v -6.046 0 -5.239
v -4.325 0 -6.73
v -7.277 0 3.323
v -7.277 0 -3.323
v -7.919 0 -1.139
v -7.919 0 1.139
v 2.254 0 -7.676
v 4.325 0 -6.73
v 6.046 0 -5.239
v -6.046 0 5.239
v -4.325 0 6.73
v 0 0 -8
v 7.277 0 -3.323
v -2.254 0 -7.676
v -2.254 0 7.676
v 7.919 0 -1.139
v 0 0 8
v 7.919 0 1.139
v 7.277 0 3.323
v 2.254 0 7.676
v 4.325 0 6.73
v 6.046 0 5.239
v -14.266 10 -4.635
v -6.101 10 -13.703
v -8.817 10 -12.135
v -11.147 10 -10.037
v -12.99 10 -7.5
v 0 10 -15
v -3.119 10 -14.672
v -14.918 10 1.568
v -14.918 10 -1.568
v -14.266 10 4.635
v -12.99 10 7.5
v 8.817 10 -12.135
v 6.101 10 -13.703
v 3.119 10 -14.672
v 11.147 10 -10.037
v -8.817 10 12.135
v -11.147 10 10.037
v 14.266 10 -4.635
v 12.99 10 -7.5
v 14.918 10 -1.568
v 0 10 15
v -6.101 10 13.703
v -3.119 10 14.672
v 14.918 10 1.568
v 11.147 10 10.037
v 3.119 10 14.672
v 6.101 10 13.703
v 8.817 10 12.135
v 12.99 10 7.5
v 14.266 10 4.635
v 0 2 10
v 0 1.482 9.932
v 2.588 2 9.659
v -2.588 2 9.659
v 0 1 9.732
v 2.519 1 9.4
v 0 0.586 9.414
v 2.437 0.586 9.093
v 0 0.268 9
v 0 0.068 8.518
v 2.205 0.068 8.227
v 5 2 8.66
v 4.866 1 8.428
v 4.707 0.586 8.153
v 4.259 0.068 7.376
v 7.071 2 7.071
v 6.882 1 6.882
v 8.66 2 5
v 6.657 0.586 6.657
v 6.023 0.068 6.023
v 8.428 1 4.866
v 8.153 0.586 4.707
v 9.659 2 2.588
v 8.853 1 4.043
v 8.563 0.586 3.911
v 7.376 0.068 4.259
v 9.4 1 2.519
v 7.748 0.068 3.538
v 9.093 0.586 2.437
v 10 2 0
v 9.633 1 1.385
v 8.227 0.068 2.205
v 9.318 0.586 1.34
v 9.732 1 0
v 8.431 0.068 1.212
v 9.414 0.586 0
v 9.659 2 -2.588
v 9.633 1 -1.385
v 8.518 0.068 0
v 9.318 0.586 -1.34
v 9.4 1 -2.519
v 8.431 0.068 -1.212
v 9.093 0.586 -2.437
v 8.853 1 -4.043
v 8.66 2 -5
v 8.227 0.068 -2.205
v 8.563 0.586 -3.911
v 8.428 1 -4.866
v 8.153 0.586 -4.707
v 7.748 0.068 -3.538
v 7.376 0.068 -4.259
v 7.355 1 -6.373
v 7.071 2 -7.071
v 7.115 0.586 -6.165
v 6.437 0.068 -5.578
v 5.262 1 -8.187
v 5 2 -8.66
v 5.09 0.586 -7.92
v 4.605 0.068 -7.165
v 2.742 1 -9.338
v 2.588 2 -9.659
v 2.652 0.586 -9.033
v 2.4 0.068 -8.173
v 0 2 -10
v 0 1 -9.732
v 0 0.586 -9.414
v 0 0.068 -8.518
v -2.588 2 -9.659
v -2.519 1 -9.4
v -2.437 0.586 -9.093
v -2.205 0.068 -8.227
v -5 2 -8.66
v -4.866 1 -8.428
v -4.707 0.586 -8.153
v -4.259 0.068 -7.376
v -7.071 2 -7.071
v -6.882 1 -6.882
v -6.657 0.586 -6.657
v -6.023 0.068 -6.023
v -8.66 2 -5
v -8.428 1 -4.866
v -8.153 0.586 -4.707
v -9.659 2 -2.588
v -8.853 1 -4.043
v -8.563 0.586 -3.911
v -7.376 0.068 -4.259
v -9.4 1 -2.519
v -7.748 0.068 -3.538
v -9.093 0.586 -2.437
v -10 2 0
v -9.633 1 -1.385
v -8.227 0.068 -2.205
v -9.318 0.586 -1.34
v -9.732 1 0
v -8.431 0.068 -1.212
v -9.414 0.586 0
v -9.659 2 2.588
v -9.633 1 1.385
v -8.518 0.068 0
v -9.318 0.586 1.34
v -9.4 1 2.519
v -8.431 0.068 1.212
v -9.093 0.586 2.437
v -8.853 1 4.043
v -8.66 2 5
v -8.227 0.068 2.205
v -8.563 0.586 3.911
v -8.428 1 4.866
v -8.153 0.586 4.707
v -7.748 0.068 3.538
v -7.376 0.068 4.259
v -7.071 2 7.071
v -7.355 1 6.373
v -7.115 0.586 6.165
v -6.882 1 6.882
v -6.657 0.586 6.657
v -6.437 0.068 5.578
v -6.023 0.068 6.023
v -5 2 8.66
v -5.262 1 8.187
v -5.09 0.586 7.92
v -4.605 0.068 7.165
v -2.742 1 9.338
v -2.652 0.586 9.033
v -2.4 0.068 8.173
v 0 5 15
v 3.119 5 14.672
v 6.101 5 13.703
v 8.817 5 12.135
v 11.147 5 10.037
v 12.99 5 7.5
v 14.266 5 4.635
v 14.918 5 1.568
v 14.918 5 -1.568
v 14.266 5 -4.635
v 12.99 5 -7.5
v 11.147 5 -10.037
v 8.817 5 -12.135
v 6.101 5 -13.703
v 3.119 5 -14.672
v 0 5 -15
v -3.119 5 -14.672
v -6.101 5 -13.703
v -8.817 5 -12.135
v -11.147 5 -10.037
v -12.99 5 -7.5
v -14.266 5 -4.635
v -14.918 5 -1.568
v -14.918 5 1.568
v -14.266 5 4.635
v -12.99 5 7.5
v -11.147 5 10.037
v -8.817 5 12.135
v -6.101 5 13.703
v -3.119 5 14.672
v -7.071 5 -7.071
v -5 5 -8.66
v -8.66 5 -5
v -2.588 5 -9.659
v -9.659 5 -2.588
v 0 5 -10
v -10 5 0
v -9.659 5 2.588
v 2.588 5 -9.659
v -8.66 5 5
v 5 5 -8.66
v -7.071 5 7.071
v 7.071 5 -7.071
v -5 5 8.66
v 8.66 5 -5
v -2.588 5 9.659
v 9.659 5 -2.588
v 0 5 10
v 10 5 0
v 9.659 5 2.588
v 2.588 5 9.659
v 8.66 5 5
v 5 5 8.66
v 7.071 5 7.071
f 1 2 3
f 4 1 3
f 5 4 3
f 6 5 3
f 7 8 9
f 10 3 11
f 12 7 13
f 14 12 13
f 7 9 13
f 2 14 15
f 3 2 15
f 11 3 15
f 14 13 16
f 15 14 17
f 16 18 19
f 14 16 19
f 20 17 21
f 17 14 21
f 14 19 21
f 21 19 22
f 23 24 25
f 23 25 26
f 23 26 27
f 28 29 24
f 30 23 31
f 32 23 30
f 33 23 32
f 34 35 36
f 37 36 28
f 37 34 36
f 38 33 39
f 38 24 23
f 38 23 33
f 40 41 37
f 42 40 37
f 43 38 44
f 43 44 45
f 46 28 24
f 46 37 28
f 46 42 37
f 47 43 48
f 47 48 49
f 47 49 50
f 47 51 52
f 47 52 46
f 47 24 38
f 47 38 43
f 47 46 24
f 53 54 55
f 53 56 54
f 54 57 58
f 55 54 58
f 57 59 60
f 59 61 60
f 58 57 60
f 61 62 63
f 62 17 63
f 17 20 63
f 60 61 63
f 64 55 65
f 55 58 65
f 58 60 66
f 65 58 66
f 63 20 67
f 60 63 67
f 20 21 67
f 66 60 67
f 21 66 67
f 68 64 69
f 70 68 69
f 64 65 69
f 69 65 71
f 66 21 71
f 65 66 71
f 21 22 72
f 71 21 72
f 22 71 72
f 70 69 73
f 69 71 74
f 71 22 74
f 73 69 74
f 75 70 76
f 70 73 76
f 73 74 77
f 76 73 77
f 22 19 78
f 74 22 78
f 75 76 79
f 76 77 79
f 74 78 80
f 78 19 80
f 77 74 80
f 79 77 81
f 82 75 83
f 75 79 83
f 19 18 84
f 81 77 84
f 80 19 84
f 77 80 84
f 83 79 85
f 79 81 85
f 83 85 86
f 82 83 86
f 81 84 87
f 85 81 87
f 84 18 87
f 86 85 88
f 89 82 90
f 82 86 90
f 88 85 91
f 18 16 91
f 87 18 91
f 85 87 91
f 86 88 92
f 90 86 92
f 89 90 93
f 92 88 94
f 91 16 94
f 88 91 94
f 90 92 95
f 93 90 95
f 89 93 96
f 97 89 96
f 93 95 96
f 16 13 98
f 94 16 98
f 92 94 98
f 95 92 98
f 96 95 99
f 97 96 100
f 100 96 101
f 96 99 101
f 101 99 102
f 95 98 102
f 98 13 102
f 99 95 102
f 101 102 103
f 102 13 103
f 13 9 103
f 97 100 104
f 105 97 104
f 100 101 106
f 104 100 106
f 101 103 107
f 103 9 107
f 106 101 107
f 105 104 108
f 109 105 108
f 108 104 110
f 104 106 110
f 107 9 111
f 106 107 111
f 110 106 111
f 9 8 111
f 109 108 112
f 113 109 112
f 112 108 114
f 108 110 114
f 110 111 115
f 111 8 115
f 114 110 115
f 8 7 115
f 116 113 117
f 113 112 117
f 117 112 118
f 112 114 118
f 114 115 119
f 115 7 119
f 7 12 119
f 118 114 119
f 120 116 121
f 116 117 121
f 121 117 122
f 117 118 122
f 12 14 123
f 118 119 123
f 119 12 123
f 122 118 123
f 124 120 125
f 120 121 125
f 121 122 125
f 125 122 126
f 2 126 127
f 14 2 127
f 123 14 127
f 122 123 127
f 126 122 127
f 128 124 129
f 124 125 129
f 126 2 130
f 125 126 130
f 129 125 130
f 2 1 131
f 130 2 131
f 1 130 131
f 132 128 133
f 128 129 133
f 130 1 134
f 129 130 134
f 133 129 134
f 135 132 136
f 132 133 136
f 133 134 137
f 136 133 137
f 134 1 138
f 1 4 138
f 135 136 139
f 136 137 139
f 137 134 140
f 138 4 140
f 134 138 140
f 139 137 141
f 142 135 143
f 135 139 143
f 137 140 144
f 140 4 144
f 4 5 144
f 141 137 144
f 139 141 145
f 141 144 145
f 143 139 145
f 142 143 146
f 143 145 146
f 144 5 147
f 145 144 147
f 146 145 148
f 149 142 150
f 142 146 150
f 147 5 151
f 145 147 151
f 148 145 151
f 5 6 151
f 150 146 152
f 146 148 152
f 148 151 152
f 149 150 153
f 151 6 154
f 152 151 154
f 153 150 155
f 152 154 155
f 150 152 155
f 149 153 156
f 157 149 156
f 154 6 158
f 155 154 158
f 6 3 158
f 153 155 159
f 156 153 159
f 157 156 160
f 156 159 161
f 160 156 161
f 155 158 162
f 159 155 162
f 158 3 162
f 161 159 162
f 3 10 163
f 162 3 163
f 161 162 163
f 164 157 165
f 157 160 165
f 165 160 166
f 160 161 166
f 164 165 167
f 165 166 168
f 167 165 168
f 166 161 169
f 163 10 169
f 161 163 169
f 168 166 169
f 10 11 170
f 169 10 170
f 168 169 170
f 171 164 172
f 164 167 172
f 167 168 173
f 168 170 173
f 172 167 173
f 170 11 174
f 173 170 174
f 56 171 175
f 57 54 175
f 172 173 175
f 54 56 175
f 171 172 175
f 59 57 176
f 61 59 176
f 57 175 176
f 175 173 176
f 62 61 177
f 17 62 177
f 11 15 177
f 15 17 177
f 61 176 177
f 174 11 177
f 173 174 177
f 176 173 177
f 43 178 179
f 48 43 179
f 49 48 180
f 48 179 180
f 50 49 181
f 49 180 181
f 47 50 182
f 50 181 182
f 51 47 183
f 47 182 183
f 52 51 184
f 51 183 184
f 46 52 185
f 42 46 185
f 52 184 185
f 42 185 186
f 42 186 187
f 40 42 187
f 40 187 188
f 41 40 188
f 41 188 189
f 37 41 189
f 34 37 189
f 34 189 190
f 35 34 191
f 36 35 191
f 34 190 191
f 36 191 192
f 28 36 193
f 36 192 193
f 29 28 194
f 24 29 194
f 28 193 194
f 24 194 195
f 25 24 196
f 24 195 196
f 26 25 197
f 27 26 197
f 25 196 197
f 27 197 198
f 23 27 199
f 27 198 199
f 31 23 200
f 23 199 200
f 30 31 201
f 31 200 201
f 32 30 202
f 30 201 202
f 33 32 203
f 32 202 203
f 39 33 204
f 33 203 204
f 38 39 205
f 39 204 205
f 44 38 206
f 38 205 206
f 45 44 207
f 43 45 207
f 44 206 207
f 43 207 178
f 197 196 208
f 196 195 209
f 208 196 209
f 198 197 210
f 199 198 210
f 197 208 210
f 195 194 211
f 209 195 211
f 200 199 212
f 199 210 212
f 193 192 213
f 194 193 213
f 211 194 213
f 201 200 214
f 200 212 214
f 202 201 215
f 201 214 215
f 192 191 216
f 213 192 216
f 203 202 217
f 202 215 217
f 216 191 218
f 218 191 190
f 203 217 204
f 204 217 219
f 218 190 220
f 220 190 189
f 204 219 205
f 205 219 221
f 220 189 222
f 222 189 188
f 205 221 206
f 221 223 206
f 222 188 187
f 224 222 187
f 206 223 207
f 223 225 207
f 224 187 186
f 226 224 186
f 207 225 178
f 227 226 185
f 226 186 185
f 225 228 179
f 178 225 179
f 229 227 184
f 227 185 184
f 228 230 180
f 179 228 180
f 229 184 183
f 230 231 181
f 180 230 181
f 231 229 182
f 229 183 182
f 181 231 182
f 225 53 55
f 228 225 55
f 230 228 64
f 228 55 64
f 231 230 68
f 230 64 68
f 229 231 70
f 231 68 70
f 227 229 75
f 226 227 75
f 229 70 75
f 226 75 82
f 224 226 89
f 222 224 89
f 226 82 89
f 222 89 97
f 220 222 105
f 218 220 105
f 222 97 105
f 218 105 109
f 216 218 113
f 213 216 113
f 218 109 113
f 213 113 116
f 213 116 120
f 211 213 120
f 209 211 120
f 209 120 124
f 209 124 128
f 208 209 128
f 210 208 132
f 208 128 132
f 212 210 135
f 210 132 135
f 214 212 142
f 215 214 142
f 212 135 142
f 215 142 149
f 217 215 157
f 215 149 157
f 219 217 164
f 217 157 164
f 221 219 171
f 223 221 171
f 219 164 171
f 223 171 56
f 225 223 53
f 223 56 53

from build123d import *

# Parameters (mm, degrees)
SZKIC1_R                    = 10
DODANIE_WYCI_GNI_CIE1_DEPTH = 5
ZAOKR_GLENIE3_R             = 2
SZKIC2_R                    = 15
DODANIE_WYCI_GNI_CIE2_DEPTH = 5


with BuildPart() as part:
    # Szkic1 → Dodanie-wyciągnięcie1 (new body)
    with BuildSketch(Plane(origin=(0, 0, 0), x_dir=(1, 0, 0), z_dir=(0, 1, 0))):
        with Locations(Location((0, 0, 0), (0, 0, 270))):
            Circle(SZKIC1_R)
    extrude(amount=DODANIE_WYCI_GNI_CIE1_DEPTH)

    # Zaokrąglenie3
    zaokr_glenie3_edges = [part.edges().sort_by_distance(p)[0] for p in [
        (0, 0, -10),
    ]]
    fillet(zaokr_glenie3_edges, radius=ZAOKR_GLENIE3_R)

    # Szkic2 → Dodanie-wyciągnięcie2 (add)
    with BuildSketch(Plane(origin=(0, 5, 0), x_dir=(1, 0, 0), z_dir=(0, 1, 0))):
        with Locations(Location((0, 0, 0), (0, 0, 270))):
            Circle(SZKIC2_R)
    extrude(amount=DODANIE_WYCI_GNI_CIE2_DEPTH)


solid = part.part
